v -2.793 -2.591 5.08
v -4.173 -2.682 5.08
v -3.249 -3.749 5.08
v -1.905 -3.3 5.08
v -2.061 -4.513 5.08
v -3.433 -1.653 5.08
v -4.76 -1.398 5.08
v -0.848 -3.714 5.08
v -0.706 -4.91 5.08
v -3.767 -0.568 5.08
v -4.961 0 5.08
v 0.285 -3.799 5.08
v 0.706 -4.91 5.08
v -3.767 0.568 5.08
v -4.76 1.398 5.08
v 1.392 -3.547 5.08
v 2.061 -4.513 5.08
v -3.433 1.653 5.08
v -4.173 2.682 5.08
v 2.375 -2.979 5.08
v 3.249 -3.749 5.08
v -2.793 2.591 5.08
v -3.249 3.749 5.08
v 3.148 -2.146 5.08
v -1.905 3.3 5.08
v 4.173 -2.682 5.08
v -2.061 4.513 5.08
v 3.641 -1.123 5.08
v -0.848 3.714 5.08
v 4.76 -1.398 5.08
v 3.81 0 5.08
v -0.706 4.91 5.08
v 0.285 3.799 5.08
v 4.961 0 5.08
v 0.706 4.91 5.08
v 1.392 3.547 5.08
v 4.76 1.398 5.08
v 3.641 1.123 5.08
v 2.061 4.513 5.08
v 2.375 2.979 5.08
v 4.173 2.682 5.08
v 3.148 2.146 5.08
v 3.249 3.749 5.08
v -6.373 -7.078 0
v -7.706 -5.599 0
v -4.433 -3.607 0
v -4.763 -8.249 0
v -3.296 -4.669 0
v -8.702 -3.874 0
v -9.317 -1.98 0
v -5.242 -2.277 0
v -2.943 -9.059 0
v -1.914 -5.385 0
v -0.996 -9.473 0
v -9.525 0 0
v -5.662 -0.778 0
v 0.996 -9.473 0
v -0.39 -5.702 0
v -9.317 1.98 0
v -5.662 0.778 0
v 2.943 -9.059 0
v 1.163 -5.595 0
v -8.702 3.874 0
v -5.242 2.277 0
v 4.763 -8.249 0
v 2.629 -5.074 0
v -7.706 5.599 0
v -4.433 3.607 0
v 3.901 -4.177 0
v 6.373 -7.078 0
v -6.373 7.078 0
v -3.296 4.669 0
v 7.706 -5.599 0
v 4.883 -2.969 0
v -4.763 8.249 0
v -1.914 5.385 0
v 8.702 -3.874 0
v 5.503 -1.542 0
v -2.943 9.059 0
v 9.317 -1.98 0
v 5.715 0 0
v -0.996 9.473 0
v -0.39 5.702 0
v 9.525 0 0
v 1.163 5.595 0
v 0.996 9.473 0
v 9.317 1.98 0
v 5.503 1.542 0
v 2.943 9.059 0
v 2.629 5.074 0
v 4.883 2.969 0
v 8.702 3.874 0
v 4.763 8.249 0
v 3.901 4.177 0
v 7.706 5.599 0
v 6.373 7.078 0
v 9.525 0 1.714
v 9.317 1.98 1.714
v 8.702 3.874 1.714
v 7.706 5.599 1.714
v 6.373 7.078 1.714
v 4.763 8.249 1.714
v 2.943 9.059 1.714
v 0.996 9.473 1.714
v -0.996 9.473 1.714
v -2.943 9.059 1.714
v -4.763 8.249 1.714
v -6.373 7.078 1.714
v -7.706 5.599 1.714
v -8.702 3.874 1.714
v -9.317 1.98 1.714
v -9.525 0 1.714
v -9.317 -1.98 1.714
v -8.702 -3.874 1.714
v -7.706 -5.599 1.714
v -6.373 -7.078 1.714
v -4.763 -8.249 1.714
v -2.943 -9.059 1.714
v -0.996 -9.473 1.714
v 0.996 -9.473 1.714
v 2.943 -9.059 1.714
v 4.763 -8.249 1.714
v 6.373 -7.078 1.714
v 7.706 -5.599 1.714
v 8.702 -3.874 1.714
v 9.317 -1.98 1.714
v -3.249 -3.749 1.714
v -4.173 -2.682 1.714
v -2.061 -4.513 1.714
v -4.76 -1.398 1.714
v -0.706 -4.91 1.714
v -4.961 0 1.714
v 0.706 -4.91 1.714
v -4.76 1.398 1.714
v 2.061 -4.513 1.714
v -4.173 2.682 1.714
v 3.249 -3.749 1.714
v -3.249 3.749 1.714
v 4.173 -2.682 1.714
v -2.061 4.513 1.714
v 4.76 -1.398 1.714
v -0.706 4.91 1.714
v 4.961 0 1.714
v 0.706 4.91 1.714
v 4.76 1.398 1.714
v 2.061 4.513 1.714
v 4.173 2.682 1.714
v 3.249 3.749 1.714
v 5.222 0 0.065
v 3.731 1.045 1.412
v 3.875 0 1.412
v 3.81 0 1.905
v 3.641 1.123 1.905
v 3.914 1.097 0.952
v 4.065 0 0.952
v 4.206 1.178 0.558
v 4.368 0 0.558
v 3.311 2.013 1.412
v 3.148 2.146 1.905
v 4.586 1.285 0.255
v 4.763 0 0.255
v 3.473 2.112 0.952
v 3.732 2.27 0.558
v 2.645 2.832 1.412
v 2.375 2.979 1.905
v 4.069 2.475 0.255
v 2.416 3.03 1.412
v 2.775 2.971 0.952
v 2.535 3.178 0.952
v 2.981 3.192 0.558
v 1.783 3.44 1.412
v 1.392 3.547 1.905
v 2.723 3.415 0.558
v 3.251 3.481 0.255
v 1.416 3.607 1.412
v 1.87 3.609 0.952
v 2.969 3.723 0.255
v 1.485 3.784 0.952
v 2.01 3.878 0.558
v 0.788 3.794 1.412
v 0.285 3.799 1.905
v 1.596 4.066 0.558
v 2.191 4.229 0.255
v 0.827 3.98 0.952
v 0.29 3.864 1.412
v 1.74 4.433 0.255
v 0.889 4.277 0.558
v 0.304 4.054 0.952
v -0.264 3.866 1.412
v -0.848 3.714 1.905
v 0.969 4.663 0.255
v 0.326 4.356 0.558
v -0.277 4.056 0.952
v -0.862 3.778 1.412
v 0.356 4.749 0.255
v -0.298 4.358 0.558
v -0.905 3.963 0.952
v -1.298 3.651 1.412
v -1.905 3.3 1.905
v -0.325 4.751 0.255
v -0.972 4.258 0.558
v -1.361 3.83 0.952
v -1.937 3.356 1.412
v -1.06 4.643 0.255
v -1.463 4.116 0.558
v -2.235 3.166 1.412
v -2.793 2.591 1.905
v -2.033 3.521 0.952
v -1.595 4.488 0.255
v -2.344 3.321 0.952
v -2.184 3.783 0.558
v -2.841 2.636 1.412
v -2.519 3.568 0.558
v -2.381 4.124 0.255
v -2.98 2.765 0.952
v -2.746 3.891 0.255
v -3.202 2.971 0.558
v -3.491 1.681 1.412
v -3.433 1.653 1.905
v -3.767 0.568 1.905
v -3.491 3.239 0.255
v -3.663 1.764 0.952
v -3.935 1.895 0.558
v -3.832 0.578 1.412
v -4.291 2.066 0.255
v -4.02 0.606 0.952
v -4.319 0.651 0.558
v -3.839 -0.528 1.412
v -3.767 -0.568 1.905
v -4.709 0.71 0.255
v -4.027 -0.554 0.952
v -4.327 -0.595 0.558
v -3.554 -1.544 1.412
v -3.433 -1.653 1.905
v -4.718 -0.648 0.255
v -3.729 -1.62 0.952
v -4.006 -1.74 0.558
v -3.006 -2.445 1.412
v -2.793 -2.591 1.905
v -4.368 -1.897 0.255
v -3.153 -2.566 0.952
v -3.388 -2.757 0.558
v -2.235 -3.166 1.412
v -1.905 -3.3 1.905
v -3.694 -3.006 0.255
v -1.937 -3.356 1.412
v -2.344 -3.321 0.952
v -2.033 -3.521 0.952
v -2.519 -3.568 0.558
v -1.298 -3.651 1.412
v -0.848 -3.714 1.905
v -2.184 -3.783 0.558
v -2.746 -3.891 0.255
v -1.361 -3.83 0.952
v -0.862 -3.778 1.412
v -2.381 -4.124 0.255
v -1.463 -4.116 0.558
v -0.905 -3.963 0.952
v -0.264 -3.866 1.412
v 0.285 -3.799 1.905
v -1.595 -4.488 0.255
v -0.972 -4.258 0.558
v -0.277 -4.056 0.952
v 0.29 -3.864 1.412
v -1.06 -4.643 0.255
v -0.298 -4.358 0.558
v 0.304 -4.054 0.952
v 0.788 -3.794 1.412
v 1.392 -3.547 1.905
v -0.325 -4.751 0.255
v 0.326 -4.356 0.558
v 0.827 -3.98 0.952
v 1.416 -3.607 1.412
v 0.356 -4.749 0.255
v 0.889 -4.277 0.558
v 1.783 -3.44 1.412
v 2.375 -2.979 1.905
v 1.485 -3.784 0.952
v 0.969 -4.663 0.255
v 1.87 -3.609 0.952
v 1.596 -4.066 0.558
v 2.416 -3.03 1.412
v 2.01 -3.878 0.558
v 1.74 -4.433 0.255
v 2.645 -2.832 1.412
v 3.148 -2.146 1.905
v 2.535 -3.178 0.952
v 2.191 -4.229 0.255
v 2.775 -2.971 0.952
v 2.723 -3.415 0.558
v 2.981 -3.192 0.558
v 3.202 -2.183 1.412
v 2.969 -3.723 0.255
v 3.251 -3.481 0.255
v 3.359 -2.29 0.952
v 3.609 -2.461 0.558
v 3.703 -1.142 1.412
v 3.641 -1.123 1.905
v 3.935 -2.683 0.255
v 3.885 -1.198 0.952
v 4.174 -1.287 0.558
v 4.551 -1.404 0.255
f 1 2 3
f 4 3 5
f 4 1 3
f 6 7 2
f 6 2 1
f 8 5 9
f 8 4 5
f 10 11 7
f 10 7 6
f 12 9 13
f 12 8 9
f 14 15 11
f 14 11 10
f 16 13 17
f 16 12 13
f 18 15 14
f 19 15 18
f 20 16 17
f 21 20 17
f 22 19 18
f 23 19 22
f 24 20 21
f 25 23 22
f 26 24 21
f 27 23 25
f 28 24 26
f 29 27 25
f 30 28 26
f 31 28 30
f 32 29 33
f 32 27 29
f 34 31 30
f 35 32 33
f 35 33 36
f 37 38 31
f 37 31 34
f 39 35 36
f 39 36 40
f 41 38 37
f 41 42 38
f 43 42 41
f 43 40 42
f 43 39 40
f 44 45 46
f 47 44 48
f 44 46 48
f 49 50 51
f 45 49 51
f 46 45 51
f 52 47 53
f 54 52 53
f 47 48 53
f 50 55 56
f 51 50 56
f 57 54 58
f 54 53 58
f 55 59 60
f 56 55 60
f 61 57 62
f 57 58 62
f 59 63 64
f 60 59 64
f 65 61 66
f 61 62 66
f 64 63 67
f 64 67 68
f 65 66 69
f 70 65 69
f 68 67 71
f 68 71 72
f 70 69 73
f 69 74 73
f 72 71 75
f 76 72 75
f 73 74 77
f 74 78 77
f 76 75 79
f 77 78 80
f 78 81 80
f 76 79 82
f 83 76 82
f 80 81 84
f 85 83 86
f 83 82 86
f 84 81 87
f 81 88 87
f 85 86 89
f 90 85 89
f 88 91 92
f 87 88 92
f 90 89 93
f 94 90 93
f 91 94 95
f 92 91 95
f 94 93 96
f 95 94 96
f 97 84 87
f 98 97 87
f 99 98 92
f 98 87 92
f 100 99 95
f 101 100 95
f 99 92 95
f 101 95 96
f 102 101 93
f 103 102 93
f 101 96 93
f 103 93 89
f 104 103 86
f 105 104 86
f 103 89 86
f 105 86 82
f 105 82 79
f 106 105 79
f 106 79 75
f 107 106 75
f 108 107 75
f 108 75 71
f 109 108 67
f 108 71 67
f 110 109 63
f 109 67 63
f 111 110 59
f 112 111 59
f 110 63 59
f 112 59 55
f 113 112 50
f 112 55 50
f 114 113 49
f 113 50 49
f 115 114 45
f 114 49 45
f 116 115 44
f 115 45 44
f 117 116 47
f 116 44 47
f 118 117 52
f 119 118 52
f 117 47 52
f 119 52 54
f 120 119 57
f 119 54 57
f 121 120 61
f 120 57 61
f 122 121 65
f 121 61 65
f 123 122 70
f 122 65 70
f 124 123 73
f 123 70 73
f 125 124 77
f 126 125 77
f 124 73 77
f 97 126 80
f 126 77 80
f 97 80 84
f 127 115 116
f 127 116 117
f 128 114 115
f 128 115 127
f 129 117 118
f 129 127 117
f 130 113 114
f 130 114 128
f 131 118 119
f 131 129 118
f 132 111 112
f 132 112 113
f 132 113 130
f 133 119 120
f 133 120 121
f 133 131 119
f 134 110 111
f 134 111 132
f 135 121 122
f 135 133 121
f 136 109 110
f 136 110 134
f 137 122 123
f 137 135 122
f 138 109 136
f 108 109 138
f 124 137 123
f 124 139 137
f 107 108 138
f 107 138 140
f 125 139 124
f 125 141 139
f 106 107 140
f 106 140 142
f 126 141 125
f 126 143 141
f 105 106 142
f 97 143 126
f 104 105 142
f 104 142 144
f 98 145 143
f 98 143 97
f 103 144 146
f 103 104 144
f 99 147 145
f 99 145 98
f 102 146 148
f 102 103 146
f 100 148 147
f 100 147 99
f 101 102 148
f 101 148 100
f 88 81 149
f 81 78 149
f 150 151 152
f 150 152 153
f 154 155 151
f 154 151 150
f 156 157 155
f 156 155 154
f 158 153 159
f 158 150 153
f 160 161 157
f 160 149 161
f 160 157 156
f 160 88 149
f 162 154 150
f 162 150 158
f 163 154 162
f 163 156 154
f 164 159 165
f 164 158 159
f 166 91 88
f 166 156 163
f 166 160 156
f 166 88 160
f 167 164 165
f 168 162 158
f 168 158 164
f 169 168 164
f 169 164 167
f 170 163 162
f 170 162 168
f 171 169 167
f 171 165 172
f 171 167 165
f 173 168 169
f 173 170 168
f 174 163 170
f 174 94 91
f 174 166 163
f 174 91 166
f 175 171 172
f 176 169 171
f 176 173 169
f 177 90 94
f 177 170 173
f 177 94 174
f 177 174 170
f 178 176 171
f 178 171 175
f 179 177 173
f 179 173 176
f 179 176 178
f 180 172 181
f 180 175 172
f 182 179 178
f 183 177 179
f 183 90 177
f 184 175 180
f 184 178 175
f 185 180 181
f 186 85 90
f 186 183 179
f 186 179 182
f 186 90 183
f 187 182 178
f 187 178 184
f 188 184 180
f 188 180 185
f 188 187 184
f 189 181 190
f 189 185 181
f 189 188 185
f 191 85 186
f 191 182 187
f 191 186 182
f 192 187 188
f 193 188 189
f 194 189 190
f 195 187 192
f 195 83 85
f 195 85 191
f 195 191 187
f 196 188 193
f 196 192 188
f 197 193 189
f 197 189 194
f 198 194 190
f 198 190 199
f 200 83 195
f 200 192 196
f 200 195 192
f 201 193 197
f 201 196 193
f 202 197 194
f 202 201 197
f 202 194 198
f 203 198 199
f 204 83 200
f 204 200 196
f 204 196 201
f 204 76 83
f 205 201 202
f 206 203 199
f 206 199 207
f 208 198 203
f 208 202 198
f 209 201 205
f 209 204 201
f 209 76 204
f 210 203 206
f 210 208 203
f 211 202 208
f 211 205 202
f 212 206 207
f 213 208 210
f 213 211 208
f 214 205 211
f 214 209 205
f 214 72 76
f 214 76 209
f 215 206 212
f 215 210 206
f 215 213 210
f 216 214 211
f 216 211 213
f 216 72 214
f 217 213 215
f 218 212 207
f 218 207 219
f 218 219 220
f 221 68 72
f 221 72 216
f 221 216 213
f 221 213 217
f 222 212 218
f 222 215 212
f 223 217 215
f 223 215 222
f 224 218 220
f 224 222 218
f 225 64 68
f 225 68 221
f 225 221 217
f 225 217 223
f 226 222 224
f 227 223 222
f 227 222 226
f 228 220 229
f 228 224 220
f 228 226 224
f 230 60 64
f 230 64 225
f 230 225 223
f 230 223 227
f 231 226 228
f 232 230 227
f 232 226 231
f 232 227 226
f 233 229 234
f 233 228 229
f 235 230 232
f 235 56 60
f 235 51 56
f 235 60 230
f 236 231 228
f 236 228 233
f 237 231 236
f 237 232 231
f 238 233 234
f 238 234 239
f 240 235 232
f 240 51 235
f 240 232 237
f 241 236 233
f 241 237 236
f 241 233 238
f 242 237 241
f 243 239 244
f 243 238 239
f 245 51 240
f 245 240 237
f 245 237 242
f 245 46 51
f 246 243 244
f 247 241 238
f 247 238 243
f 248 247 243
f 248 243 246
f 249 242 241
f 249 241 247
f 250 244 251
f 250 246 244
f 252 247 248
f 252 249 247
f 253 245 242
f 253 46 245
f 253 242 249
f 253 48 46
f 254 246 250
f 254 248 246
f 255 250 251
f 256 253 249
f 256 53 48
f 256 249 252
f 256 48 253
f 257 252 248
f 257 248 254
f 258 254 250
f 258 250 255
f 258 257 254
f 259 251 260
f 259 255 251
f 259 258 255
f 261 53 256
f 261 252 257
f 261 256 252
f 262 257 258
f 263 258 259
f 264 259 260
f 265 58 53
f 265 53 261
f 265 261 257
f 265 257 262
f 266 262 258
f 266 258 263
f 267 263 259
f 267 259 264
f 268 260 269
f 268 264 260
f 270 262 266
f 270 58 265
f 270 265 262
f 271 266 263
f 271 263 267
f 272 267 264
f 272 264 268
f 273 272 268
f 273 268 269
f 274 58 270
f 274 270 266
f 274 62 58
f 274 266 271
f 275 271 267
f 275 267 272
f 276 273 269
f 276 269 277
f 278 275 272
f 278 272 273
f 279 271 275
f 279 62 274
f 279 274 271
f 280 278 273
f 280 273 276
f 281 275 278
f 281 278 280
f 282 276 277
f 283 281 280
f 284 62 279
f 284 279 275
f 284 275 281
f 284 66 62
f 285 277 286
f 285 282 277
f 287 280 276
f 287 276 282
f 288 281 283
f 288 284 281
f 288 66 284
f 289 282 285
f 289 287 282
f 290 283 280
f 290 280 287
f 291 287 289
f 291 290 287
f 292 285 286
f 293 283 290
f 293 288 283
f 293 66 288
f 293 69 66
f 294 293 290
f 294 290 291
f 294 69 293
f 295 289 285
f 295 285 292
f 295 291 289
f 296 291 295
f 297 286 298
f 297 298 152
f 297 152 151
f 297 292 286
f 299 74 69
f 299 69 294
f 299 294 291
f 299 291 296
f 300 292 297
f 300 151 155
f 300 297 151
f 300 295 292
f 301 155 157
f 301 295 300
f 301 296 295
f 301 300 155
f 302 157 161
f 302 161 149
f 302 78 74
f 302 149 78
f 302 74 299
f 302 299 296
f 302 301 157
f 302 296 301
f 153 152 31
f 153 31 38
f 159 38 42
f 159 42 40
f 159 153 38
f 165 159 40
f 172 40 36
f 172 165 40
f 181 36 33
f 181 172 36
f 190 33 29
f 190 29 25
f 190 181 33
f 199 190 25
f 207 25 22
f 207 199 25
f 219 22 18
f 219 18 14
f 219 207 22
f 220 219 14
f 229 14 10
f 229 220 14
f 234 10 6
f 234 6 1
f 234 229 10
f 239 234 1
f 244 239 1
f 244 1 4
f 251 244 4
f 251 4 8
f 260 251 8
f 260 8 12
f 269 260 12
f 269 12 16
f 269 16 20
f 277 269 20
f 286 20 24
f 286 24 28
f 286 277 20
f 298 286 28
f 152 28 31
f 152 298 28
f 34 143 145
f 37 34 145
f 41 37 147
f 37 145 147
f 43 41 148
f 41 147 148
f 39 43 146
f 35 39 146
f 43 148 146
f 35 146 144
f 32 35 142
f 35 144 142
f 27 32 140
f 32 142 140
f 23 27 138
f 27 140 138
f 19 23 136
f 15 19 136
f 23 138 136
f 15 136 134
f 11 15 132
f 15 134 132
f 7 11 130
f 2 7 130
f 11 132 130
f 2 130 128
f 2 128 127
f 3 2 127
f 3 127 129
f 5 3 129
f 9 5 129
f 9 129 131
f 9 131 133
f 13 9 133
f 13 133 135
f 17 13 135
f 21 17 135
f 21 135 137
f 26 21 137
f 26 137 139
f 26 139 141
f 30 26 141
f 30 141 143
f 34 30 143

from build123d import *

# Parameters (mm, degrees)
F0_R     = 9.525
F0_R_2   = 4.960938
F1_DEPTH = 1.7145
F0_R_3   = 3.81
F2_DEPTH = 5.08
F3_R     = 1.905


with BuildPart() as f1:
    # F0 (on Top) → F1 (new body)
    with BuildSketch(Plane.XY):
        Circle(F0_R)
        Circle(F0_R_2, mode=Mode.SUBTRACT)
    extrude(amount=F1_DEPTH)

    # F0 (on Top) → F2 (join)
    with BuildSketch(Plane.XY):
        Circle(F0_R_2)
        Circle(F0_R_3, mode=Mode.SUBTRACT)
    extrude(amount=F2_DEPTH)

    # F3
    f3_edges = [f1.edges().sort_by_distance(p)[0] for p in [
        (-3.81, 0, 0),
    ]]
    fillet(f3_edges, radius=F3_R)


solid = f1.part
